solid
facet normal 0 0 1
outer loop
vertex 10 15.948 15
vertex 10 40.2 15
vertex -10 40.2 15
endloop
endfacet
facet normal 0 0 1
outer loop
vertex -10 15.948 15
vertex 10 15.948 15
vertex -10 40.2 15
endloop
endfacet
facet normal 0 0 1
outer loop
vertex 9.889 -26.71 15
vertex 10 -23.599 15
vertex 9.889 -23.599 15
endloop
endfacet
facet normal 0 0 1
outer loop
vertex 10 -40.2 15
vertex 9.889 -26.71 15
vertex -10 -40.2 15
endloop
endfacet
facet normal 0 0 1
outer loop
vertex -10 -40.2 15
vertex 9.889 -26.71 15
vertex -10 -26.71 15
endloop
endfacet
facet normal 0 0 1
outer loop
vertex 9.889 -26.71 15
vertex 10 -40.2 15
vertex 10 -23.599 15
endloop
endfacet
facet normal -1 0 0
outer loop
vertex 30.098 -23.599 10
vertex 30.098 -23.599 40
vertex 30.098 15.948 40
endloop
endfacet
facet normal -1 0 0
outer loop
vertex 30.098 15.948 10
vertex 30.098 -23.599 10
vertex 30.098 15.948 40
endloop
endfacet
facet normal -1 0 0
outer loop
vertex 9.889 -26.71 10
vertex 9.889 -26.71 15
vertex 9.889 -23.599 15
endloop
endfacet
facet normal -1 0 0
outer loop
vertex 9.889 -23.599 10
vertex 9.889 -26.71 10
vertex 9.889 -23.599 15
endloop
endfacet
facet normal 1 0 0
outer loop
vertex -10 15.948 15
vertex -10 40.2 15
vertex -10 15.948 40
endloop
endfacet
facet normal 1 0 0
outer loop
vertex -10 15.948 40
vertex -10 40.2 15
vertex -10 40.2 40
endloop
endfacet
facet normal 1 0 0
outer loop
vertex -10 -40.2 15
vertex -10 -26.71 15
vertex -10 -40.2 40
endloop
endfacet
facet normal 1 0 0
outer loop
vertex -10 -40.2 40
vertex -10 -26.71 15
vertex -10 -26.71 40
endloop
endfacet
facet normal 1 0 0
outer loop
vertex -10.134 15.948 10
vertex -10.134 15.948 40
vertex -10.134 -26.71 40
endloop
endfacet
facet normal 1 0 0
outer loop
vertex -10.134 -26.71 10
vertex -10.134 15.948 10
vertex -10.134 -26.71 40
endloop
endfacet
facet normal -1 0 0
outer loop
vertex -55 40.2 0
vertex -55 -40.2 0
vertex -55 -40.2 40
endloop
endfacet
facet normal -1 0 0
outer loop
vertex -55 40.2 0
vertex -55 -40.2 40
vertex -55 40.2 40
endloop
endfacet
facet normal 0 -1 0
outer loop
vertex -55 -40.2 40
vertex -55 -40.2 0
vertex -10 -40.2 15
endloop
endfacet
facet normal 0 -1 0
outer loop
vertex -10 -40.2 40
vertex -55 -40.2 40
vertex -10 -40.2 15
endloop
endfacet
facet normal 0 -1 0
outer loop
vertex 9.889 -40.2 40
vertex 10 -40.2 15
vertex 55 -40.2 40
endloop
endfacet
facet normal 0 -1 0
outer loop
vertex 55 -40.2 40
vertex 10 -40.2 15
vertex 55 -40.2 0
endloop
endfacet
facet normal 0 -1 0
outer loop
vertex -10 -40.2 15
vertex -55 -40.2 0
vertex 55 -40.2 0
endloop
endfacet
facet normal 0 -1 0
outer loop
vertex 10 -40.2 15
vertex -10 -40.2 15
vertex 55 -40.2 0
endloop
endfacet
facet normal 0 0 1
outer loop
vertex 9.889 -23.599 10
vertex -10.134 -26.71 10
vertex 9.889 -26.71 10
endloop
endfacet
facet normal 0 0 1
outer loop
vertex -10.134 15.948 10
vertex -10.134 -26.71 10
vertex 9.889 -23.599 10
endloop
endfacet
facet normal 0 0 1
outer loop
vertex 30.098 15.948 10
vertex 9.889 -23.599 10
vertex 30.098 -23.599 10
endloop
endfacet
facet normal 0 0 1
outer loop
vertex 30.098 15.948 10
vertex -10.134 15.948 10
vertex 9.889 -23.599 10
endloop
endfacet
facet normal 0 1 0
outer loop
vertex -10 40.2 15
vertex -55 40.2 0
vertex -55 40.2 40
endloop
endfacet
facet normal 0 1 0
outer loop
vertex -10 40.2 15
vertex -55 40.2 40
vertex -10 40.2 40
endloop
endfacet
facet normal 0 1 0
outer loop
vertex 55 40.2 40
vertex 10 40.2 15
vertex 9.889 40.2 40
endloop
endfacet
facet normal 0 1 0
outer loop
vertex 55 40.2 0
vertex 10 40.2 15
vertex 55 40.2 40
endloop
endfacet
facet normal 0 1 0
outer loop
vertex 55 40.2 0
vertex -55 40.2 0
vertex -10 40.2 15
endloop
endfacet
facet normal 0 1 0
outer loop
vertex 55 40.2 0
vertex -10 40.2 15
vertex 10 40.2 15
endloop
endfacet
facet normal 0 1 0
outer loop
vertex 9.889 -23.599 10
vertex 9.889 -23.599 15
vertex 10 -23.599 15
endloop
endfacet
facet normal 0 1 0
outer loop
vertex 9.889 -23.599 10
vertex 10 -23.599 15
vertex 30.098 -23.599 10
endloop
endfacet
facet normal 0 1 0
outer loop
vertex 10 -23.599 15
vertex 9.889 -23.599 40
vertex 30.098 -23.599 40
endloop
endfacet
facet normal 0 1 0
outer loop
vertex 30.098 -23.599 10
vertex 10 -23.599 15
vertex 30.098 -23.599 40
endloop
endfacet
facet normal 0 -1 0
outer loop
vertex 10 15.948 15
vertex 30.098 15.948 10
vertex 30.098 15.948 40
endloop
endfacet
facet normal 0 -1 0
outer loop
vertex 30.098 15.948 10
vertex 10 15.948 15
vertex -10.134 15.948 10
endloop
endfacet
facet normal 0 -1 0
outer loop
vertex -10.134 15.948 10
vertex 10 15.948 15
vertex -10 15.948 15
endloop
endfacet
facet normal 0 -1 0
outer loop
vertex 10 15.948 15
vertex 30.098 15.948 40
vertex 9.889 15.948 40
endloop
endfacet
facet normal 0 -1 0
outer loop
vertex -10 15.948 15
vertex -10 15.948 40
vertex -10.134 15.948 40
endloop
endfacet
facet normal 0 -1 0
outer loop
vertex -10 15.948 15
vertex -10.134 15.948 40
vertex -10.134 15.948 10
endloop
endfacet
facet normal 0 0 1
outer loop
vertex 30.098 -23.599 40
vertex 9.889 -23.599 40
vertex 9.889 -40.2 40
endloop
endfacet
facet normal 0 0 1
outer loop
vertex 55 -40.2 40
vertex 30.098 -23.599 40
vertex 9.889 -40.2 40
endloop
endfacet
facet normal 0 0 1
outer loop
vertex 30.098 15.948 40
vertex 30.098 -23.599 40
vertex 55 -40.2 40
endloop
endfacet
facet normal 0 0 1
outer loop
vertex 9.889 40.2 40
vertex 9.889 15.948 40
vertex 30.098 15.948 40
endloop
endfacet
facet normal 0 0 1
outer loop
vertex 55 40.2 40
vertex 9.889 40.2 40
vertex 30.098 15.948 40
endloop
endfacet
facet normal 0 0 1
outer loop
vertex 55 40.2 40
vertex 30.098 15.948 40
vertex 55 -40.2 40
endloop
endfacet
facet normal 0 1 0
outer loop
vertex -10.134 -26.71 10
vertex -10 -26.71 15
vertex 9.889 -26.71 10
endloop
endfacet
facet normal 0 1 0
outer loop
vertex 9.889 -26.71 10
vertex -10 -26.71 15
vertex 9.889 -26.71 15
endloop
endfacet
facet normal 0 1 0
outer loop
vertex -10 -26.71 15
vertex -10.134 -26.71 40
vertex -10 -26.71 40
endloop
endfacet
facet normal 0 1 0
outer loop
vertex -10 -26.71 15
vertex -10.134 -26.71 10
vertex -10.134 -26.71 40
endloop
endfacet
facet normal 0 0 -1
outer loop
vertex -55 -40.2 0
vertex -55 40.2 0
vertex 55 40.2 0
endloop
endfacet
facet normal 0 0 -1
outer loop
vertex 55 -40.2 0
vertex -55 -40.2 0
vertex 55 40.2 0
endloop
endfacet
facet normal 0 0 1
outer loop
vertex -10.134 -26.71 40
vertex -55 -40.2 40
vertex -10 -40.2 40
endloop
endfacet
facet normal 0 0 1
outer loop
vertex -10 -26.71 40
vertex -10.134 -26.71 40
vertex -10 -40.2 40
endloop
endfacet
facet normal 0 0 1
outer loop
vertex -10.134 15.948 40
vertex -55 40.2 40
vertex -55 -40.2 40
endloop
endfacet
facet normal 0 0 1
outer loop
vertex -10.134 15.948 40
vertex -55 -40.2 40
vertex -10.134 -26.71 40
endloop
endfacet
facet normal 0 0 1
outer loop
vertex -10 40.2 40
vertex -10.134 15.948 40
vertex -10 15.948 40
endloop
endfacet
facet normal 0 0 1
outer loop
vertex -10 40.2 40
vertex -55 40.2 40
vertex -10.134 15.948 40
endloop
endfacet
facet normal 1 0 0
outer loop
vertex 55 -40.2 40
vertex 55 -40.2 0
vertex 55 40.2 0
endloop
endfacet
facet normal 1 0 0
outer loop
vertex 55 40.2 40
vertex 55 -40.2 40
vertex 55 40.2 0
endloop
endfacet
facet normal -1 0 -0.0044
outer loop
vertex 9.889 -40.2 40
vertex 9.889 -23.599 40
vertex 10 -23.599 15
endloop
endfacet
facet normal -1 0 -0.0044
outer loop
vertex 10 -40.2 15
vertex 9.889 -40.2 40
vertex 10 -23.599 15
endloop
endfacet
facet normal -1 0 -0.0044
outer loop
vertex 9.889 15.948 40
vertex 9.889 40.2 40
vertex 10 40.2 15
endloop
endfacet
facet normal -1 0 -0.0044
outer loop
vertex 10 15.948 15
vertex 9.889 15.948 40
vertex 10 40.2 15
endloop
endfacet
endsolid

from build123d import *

# Parameters (mm, degrees)
IZIM1_W                     = 110
IZIM1_H                     = 80.4
Y_KSEKLIK_EKSTR_ZYON1_DEPTH = 40
KES_EKSTR_ZYON1_DEPTH       = 30
KES_EKSTR_ZYON2_DEPTH       = 106.305080599


with BuildPart() as part:
    # Çizim1 → Yükseklik-Ekstrüzyon1 (new body)
    with BuildSketch(Plane.XY):
        Rectangle(IZIM1_W, IZIM1_H)
    extrude(amount=Y_KSEKLIK_EKSTR_ZYON1_DEPTH)

    # Çizim2 → Kes-Ekstrüzyon1 (cut)
    with BuildSketch(Plane.XY.offset(40)):
        Polygon((30.097607873, 15.947775896), (-10.133916247, 15.947775896), (-10.133916247, -26.710477825), (9.889023344, -26.710477825), (9.889023344, -23.599429186), (30.097607873, -23.599429186), align=None)
    extrude(amount=-KES_EKSTR_ZYON1_DEPTH, mode=Mode.SUBTRACT)

    # Çizim3 → Kes-Ekstrüzyon2 (cut, through all)
    with BuildSketch(Plane(origin=(0, 40.2, 0), x_dir=(1, 0, 0), z_dir=(0, 1, 0))):
        Polygon((9.889023344, -40), (10, -15), (-10, -15), (-10, -40), align=None)
    extrude(amount=-KES_EKSTR_ZYON2_DEPTH, mode=Mode.SUBTRACT)


solid = part.part
